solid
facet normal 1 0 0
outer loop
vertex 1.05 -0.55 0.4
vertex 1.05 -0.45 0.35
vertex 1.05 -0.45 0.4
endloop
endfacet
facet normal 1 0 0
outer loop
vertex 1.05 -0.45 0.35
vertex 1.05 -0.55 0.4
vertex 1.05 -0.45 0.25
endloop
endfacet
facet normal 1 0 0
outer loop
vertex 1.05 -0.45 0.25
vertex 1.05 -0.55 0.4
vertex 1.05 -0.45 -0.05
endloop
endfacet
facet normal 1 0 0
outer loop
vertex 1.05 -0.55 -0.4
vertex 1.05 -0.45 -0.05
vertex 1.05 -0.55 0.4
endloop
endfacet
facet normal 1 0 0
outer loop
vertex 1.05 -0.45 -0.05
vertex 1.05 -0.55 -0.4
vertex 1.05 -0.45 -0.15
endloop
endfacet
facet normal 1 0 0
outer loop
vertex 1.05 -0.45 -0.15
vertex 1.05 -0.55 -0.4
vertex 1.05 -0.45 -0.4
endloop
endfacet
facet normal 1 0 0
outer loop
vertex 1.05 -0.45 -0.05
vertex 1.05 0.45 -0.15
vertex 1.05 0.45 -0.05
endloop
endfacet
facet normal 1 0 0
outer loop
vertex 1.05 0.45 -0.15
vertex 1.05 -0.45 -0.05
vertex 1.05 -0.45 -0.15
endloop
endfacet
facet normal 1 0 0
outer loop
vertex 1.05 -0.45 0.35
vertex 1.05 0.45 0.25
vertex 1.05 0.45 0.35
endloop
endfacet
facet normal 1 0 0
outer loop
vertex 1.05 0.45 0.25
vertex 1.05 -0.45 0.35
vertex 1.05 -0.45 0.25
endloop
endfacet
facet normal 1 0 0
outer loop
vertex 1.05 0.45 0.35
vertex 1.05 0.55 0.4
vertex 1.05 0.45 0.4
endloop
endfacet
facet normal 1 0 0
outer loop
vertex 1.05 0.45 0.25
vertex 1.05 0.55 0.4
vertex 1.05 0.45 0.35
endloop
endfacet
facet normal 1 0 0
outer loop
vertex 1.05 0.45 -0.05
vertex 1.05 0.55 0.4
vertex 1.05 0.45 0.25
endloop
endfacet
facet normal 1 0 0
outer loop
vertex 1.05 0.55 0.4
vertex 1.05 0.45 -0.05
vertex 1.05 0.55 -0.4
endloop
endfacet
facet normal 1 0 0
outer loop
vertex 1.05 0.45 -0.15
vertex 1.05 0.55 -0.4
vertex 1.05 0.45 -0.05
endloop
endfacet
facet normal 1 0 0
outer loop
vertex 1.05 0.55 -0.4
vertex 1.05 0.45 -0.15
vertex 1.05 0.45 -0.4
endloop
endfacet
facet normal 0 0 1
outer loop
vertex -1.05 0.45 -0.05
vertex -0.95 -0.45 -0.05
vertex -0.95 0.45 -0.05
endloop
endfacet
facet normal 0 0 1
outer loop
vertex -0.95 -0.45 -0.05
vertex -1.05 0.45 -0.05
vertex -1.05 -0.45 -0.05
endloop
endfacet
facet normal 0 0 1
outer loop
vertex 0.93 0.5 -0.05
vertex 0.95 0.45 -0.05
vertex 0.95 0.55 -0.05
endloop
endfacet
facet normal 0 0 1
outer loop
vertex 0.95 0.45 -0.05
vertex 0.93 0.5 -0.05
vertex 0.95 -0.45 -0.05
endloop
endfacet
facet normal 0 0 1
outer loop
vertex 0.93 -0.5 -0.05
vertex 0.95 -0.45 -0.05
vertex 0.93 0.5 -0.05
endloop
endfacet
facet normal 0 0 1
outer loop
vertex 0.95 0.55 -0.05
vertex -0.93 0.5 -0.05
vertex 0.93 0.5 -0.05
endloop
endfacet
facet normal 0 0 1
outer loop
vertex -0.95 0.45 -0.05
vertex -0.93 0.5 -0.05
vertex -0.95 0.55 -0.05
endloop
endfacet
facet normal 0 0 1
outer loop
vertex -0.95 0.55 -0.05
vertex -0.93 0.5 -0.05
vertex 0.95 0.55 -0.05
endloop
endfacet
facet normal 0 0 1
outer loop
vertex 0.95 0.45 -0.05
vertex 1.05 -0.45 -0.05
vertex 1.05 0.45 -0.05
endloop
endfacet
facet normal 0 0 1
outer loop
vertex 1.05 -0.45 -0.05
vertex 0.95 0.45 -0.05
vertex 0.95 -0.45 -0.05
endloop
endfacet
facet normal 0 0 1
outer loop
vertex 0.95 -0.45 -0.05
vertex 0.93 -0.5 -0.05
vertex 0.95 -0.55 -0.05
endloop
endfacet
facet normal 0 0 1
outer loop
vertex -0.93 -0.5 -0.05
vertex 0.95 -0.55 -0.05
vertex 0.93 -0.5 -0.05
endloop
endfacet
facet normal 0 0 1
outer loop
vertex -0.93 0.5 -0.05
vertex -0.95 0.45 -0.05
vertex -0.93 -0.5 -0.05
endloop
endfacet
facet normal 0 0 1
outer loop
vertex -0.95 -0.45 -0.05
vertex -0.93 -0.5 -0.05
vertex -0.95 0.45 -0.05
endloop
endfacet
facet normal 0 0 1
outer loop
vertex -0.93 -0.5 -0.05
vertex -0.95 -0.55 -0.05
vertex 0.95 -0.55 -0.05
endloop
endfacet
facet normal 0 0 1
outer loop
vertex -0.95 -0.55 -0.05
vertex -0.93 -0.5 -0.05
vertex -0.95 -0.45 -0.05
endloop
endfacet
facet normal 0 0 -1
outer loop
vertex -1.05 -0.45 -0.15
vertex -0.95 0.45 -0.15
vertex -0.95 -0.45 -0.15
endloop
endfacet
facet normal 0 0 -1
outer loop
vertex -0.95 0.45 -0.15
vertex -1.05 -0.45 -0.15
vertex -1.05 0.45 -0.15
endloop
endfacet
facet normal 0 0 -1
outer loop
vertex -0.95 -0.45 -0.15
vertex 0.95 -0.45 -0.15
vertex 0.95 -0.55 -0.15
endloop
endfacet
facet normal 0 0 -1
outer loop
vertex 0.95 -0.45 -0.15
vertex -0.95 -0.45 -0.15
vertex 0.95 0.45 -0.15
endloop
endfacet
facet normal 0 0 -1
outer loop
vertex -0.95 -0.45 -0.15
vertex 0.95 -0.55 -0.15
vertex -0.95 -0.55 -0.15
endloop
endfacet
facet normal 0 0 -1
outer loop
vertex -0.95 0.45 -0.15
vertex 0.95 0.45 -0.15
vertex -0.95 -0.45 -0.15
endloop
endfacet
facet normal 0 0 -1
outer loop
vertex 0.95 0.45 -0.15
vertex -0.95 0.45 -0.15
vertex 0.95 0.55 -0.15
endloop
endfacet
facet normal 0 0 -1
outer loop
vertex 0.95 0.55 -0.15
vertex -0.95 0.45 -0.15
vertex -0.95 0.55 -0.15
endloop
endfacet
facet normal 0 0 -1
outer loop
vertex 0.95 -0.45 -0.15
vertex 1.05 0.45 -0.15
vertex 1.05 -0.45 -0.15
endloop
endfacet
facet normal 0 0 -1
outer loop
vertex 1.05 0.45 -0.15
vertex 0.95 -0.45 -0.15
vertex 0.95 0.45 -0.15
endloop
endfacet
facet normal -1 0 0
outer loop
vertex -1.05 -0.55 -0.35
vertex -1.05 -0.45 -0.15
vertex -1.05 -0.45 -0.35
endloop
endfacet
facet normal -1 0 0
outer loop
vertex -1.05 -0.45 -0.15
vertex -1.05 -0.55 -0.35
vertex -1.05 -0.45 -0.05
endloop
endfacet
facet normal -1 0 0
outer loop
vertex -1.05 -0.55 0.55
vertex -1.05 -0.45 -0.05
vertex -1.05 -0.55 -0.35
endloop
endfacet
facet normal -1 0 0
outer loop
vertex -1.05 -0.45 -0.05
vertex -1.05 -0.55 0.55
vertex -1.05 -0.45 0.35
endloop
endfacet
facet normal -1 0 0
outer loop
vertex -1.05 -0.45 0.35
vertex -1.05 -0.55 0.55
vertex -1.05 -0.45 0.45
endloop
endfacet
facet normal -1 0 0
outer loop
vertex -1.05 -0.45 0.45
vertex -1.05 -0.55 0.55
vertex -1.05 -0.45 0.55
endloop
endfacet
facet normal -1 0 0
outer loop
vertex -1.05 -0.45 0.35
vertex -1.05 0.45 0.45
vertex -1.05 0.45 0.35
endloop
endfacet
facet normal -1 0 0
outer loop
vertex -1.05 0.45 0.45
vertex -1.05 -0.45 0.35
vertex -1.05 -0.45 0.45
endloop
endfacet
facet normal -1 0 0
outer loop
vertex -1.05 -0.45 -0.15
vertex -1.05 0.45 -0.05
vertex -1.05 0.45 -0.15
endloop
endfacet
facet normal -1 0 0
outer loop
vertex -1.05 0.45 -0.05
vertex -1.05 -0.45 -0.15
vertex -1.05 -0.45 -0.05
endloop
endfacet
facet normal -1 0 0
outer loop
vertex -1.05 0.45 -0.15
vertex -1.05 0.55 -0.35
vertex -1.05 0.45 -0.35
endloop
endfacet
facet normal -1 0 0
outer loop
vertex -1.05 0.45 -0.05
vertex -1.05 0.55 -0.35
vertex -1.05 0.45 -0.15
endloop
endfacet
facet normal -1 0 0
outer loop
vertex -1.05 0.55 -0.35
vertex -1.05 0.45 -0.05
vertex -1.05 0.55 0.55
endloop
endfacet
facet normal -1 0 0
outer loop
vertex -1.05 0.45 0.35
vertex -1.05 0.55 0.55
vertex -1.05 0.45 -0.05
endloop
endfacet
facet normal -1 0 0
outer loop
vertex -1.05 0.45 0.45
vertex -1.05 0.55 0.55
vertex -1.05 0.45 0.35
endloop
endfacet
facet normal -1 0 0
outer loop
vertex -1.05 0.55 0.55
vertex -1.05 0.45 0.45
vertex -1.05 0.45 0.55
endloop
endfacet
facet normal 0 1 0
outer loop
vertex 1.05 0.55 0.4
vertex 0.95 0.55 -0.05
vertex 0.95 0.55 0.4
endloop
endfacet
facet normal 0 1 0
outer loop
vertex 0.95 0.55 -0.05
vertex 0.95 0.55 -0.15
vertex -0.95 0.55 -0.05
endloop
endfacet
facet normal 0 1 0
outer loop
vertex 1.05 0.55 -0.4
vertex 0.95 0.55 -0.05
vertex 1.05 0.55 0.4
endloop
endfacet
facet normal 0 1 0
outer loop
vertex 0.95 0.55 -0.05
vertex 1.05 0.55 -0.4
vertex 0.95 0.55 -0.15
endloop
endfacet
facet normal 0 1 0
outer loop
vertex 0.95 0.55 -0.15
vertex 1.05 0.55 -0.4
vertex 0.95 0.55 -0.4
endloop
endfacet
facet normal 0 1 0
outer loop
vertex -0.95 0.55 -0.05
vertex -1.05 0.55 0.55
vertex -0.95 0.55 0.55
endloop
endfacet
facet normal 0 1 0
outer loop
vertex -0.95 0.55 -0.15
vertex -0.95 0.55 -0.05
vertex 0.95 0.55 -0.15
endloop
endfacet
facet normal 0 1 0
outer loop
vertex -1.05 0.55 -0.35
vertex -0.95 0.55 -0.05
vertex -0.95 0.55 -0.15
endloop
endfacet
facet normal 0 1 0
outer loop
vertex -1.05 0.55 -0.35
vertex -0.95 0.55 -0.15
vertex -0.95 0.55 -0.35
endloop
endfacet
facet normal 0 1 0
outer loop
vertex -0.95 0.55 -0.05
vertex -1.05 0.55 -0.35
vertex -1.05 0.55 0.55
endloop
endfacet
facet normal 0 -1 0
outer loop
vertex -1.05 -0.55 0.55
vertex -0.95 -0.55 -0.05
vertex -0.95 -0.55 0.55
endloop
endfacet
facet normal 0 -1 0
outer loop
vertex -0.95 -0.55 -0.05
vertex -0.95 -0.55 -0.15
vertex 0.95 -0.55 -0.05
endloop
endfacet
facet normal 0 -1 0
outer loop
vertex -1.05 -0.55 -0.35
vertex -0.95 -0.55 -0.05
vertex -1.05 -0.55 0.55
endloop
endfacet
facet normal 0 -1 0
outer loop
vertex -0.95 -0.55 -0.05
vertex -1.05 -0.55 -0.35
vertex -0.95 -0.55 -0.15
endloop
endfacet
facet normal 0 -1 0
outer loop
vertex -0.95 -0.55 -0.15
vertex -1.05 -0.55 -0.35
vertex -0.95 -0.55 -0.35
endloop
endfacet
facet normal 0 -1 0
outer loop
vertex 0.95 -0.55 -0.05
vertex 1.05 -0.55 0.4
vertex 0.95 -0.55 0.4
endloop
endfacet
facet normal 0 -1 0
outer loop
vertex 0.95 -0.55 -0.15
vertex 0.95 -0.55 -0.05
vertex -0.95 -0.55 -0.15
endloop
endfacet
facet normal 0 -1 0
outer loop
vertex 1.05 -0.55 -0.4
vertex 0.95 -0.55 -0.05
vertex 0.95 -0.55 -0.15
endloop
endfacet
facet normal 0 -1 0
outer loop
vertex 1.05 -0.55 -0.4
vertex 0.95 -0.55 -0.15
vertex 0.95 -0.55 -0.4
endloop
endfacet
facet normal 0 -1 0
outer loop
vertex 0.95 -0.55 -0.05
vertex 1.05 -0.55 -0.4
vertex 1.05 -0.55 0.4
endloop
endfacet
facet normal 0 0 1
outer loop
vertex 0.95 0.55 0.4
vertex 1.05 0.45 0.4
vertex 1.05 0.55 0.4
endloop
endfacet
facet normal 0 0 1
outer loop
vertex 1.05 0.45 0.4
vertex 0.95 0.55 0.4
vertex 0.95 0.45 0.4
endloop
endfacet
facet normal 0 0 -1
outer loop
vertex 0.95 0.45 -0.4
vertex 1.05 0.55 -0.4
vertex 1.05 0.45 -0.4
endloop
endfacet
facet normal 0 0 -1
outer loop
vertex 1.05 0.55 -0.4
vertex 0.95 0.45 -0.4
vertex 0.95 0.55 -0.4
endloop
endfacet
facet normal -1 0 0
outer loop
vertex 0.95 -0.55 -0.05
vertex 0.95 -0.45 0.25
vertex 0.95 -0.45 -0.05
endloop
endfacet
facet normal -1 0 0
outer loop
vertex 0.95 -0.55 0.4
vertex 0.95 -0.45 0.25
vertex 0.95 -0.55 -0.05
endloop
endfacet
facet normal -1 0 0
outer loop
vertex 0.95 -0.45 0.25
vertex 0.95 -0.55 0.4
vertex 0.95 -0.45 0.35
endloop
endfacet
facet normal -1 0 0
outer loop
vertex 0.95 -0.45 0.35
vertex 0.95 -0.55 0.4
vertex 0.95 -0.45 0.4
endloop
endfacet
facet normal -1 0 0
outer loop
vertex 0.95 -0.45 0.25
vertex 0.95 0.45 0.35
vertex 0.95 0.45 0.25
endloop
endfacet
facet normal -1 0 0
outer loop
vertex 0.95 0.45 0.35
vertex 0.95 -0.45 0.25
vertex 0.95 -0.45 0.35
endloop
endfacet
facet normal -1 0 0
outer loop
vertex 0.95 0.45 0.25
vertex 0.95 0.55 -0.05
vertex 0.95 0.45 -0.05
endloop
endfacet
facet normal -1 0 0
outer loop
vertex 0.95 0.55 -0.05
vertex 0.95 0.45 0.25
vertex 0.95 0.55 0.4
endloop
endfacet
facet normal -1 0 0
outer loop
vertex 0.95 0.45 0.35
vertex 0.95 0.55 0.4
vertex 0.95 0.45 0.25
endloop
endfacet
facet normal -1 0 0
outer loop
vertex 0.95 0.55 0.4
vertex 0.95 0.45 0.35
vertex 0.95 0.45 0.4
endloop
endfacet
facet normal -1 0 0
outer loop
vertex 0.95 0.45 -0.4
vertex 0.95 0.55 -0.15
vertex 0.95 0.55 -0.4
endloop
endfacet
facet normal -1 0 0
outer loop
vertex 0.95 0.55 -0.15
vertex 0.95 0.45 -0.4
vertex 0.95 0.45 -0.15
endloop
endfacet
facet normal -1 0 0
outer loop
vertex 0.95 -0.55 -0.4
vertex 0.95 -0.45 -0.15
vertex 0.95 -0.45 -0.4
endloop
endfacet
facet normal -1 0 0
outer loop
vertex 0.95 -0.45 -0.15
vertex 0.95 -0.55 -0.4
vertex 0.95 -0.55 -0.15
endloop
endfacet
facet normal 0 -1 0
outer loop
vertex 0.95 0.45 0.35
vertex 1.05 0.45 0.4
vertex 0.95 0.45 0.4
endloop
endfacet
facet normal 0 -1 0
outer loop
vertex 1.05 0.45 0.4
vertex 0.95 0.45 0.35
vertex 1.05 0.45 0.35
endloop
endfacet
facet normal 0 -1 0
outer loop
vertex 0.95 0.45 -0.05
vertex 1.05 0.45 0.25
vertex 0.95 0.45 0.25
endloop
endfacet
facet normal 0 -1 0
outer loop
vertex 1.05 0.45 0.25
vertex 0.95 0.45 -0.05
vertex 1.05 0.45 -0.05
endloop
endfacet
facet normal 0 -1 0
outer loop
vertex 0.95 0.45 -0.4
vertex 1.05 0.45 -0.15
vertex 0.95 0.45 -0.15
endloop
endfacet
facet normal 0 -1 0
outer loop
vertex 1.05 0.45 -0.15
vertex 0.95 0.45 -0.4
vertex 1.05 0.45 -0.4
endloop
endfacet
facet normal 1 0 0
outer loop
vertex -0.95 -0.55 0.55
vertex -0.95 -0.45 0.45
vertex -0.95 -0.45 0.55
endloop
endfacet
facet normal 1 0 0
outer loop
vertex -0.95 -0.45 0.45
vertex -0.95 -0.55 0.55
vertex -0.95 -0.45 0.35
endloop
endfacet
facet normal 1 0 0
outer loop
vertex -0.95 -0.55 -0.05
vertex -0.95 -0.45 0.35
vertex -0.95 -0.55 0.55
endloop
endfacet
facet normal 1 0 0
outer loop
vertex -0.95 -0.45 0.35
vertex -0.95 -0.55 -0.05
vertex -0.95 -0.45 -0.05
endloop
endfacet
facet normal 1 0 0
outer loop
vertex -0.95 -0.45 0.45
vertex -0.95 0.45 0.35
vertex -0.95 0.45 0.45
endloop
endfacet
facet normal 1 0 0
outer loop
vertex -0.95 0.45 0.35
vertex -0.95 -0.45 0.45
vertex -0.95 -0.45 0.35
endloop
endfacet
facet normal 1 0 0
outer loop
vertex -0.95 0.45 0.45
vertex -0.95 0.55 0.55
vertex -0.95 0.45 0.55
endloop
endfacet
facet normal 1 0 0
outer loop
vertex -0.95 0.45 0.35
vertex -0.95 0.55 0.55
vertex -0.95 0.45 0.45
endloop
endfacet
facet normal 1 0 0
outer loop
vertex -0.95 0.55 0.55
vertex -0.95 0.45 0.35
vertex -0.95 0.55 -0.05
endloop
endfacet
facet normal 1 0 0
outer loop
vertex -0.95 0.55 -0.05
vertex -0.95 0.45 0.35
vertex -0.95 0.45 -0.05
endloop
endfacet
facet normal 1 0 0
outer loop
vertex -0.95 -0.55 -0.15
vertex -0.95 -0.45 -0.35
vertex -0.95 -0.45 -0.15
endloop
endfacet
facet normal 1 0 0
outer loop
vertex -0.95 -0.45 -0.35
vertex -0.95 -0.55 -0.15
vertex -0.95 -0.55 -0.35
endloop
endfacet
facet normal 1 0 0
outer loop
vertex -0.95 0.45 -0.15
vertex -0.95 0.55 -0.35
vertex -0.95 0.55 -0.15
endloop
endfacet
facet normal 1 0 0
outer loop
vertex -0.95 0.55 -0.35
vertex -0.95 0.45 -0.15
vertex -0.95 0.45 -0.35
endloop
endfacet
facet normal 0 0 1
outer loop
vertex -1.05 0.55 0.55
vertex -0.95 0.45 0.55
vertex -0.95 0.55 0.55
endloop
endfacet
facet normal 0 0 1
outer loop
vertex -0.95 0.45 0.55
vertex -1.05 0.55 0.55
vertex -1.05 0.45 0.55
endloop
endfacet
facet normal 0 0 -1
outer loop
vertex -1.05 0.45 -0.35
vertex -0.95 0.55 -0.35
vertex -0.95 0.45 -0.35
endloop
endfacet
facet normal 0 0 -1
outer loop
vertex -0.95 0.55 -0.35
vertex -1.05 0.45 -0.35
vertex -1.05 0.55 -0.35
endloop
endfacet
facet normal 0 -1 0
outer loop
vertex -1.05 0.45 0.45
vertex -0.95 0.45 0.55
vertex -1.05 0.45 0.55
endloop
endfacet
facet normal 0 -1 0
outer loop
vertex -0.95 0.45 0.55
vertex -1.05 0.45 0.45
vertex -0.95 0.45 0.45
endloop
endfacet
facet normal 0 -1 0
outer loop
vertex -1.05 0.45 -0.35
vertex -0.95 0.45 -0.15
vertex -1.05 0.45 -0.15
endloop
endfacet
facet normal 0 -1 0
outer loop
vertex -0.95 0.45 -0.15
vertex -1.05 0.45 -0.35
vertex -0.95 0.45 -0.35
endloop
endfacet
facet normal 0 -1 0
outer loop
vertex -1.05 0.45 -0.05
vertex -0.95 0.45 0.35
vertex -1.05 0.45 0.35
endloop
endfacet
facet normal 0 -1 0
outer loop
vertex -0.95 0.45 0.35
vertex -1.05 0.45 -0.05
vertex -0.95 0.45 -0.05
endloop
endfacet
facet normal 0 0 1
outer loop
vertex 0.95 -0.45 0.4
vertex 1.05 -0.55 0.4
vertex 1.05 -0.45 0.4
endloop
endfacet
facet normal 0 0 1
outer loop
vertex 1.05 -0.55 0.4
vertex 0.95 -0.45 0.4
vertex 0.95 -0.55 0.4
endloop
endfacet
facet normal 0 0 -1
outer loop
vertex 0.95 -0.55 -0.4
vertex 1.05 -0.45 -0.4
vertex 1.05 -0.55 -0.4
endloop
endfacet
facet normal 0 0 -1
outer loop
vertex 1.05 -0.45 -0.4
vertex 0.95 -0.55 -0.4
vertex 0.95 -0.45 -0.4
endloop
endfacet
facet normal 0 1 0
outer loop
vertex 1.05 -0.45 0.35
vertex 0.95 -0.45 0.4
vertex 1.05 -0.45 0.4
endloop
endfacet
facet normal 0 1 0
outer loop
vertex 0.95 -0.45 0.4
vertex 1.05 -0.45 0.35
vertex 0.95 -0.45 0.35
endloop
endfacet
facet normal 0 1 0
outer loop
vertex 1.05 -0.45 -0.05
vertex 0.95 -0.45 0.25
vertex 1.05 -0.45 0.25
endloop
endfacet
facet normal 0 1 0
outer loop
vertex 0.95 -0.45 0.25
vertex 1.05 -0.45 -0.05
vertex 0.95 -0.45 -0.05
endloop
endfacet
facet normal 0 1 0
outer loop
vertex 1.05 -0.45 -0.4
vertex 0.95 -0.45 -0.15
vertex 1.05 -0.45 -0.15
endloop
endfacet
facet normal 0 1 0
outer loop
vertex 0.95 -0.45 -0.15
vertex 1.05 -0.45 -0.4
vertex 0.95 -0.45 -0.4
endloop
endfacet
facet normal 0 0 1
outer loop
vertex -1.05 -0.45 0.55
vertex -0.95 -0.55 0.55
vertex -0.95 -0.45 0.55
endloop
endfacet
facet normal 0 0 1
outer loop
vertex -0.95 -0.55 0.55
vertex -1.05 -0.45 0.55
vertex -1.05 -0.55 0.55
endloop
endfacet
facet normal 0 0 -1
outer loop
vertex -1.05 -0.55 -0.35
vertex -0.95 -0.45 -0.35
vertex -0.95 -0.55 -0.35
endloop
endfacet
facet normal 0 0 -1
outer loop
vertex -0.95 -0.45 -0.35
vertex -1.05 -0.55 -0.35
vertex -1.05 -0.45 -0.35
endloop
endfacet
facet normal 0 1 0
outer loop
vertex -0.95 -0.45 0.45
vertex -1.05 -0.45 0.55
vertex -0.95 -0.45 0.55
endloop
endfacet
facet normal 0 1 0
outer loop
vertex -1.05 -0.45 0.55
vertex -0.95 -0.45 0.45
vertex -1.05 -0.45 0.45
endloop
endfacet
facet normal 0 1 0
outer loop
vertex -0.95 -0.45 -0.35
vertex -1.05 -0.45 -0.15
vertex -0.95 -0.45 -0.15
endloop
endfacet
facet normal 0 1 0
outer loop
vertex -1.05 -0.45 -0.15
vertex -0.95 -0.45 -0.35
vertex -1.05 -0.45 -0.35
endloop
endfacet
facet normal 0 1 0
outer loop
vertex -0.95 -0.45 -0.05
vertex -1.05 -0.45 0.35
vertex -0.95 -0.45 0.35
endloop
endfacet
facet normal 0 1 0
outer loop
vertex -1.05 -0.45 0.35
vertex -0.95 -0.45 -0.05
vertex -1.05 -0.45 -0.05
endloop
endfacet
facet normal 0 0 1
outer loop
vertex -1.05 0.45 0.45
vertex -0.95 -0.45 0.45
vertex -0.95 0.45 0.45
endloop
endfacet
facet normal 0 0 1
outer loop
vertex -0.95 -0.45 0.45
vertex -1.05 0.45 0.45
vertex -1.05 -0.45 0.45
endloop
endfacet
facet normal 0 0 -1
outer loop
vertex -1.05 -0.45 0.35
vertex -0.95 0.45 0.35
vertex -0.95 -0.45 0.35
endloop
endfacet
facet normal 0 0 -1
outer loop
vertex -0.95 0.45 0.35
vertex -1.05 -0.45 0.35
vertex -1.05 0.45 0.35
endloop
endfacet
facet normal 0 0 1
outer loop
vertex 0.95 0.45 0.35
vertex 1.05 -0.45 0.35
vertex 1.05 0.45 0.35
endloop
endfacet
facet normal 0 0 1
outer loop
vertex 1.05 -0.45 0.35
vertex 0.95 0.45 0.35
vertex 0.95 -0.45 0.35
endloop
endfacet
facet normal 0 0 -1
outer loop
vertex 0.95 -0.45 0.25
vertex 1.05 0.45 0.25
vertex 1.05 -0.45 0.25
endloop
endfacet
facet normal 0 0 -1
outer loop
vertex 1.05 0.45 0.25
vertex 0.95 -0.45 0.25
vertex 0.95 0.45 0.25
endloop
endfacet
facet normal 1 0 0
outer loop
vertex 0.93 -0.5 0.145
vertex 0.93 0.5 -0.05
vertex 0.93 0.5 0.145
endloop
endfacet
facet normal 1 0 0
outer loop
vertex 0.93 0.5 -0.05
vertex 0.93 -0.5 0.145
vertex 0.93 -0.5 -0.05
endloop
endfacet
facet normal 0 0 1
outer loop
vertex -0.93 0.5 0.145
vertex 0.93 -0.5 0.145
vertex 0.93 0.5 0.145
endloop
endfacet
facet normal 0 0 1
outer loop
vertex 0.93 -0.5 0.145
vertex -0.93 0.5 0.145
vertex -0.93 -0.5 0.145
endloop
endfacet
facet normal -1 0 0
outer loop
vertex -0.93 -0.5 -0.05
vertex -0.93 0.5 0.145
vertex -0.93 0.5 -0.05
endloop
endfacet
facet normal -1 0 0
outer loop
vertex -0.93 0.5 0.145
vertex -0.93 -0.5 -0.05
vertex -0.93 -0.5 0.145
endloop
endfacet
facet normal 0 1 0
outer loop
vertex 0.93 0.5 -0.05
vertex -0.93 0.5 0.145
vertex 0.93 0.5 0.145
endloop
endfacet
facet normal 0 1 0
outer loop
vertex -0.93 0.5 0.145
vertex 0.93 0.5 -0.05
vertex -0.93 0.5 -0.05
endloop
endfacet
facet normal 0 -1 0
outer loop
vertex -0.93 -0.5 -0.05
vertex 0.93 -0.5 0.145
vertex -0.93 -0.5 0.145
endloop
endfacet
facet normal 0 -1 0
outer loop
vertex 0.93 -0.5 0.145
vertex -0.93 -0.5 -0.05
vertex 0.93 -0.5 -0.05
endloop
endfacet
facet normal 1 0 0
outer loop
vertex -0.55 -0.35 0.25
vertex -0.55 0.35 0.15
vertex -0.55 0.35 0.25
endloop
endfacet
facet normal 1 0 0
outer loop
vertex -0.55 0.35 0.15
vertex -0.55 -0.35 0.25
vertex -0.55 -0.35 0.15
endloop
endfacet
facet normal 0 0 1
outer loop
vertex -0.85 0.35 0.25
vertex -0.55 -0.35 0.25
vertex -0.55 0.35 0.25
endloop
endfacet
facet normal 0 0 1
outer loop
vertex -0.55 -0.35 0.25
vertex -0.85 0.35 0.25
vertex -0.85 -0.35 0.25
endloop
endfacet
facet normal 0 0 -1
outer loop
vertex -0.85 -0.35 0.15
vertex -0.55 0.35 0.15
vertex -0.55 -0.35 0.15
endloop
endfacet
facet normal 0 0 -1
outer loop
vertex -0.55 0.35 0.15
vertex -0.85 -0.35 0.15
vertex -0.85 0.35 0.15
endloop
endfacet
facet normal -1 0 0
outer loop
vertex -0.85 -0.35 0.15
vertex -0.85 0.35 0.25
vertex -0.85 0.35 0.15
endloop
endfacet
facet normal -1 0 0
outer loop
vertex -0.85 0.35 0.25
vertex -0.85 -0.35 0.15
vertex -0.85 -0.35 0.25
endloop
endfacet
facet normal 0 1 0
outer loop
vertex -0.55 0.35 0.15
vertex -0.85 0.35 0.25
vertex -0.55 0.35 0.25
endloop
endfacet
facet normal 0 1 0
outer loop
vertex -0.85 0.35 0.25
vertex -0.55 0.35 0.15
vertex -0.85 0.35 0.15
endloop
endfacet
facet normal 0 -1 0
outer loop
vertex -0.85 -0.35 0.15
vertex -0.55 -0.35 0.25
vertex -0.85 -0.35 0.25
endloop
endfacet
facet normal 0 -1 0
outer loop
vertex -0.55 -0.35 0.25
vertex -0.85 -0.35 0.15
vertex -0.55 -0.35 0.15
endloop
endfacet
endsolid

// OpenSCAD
module Bed_02(){

    color("#bbeedd"){
        cube([1.86,1,0.29], center = true);
    }
    color("#cdaa7d"){           // Wood Structure
        translate([0,0,-0.1])
        cube([2.1,1.1,0.1], center = true);

        translate([1,0.5,0])
        cube([0.1,0.1,0.8], center = true);

        translate([-1,0.5,0.1])
        cube([0.1,0.1,0.9], center = true);

        translate([1,-0.5,0])
        cube([0.1,0.1,0.8], center = true);

        translate([-1,-0.5,0.1])
        cube([0.1,0.1,0.9], center = true);

       translate([-1,0,0.4])
       cube([0.1,0.9,0.1], center = true);
        
       translate([1,0,0.3])
       cube([0.1,0.9,0.1], center = true);
    }

    color("white"){
        translate([-0.7,0,0.2])
        cube([0.3,0.7,0.1], center = true);
    }
}

Bed_02();


// Written by Nicolì Angelo (Gengio) 2024: 
// MIT License


//Permission is hereby granted, free of charge, to any person obtaining a copy of this software and associated documentation files (the "Software"), to deal in the Software without restriction, including without limitation the rights to use, copy, modify, merge, publish, distribute, sublicense, and/or sell copies of the Software, and to permit persons to whom the Software is furnished to do so, subject to the following conditions:

//The above copyright notice and this permission notice shall be included in all copies or substantial portions of the Software.

//THE SOFTWARE IS PROVIDED "AS IS", WITHOUT WARRANTY OF ANY KIND, EXPRESS OR IMPLIED, INCLUDING BUT NOT LIMITED TO THE WARRANTIES OF MERCHANTABILITY, FITNESS FOR A PARTICULAR PURPOSE AND NONINFRINGEMENT. IN NO EVENT SHALL THE AUTHORS OR COPYRIGHT HOLDERS BE LIABLE FOR ANY CLAIM, DAMAGES OR OTHER LIABILITY, WHETHER IN AN ACTION OF CONTRACT, TORT OR OTHERWISE, ARISING FROM, OUT OF OR IN CONNECTION WITH THE SOFTWARE OR THE USE OR OTHER DEALINGS IN THE SOFTWARE.
